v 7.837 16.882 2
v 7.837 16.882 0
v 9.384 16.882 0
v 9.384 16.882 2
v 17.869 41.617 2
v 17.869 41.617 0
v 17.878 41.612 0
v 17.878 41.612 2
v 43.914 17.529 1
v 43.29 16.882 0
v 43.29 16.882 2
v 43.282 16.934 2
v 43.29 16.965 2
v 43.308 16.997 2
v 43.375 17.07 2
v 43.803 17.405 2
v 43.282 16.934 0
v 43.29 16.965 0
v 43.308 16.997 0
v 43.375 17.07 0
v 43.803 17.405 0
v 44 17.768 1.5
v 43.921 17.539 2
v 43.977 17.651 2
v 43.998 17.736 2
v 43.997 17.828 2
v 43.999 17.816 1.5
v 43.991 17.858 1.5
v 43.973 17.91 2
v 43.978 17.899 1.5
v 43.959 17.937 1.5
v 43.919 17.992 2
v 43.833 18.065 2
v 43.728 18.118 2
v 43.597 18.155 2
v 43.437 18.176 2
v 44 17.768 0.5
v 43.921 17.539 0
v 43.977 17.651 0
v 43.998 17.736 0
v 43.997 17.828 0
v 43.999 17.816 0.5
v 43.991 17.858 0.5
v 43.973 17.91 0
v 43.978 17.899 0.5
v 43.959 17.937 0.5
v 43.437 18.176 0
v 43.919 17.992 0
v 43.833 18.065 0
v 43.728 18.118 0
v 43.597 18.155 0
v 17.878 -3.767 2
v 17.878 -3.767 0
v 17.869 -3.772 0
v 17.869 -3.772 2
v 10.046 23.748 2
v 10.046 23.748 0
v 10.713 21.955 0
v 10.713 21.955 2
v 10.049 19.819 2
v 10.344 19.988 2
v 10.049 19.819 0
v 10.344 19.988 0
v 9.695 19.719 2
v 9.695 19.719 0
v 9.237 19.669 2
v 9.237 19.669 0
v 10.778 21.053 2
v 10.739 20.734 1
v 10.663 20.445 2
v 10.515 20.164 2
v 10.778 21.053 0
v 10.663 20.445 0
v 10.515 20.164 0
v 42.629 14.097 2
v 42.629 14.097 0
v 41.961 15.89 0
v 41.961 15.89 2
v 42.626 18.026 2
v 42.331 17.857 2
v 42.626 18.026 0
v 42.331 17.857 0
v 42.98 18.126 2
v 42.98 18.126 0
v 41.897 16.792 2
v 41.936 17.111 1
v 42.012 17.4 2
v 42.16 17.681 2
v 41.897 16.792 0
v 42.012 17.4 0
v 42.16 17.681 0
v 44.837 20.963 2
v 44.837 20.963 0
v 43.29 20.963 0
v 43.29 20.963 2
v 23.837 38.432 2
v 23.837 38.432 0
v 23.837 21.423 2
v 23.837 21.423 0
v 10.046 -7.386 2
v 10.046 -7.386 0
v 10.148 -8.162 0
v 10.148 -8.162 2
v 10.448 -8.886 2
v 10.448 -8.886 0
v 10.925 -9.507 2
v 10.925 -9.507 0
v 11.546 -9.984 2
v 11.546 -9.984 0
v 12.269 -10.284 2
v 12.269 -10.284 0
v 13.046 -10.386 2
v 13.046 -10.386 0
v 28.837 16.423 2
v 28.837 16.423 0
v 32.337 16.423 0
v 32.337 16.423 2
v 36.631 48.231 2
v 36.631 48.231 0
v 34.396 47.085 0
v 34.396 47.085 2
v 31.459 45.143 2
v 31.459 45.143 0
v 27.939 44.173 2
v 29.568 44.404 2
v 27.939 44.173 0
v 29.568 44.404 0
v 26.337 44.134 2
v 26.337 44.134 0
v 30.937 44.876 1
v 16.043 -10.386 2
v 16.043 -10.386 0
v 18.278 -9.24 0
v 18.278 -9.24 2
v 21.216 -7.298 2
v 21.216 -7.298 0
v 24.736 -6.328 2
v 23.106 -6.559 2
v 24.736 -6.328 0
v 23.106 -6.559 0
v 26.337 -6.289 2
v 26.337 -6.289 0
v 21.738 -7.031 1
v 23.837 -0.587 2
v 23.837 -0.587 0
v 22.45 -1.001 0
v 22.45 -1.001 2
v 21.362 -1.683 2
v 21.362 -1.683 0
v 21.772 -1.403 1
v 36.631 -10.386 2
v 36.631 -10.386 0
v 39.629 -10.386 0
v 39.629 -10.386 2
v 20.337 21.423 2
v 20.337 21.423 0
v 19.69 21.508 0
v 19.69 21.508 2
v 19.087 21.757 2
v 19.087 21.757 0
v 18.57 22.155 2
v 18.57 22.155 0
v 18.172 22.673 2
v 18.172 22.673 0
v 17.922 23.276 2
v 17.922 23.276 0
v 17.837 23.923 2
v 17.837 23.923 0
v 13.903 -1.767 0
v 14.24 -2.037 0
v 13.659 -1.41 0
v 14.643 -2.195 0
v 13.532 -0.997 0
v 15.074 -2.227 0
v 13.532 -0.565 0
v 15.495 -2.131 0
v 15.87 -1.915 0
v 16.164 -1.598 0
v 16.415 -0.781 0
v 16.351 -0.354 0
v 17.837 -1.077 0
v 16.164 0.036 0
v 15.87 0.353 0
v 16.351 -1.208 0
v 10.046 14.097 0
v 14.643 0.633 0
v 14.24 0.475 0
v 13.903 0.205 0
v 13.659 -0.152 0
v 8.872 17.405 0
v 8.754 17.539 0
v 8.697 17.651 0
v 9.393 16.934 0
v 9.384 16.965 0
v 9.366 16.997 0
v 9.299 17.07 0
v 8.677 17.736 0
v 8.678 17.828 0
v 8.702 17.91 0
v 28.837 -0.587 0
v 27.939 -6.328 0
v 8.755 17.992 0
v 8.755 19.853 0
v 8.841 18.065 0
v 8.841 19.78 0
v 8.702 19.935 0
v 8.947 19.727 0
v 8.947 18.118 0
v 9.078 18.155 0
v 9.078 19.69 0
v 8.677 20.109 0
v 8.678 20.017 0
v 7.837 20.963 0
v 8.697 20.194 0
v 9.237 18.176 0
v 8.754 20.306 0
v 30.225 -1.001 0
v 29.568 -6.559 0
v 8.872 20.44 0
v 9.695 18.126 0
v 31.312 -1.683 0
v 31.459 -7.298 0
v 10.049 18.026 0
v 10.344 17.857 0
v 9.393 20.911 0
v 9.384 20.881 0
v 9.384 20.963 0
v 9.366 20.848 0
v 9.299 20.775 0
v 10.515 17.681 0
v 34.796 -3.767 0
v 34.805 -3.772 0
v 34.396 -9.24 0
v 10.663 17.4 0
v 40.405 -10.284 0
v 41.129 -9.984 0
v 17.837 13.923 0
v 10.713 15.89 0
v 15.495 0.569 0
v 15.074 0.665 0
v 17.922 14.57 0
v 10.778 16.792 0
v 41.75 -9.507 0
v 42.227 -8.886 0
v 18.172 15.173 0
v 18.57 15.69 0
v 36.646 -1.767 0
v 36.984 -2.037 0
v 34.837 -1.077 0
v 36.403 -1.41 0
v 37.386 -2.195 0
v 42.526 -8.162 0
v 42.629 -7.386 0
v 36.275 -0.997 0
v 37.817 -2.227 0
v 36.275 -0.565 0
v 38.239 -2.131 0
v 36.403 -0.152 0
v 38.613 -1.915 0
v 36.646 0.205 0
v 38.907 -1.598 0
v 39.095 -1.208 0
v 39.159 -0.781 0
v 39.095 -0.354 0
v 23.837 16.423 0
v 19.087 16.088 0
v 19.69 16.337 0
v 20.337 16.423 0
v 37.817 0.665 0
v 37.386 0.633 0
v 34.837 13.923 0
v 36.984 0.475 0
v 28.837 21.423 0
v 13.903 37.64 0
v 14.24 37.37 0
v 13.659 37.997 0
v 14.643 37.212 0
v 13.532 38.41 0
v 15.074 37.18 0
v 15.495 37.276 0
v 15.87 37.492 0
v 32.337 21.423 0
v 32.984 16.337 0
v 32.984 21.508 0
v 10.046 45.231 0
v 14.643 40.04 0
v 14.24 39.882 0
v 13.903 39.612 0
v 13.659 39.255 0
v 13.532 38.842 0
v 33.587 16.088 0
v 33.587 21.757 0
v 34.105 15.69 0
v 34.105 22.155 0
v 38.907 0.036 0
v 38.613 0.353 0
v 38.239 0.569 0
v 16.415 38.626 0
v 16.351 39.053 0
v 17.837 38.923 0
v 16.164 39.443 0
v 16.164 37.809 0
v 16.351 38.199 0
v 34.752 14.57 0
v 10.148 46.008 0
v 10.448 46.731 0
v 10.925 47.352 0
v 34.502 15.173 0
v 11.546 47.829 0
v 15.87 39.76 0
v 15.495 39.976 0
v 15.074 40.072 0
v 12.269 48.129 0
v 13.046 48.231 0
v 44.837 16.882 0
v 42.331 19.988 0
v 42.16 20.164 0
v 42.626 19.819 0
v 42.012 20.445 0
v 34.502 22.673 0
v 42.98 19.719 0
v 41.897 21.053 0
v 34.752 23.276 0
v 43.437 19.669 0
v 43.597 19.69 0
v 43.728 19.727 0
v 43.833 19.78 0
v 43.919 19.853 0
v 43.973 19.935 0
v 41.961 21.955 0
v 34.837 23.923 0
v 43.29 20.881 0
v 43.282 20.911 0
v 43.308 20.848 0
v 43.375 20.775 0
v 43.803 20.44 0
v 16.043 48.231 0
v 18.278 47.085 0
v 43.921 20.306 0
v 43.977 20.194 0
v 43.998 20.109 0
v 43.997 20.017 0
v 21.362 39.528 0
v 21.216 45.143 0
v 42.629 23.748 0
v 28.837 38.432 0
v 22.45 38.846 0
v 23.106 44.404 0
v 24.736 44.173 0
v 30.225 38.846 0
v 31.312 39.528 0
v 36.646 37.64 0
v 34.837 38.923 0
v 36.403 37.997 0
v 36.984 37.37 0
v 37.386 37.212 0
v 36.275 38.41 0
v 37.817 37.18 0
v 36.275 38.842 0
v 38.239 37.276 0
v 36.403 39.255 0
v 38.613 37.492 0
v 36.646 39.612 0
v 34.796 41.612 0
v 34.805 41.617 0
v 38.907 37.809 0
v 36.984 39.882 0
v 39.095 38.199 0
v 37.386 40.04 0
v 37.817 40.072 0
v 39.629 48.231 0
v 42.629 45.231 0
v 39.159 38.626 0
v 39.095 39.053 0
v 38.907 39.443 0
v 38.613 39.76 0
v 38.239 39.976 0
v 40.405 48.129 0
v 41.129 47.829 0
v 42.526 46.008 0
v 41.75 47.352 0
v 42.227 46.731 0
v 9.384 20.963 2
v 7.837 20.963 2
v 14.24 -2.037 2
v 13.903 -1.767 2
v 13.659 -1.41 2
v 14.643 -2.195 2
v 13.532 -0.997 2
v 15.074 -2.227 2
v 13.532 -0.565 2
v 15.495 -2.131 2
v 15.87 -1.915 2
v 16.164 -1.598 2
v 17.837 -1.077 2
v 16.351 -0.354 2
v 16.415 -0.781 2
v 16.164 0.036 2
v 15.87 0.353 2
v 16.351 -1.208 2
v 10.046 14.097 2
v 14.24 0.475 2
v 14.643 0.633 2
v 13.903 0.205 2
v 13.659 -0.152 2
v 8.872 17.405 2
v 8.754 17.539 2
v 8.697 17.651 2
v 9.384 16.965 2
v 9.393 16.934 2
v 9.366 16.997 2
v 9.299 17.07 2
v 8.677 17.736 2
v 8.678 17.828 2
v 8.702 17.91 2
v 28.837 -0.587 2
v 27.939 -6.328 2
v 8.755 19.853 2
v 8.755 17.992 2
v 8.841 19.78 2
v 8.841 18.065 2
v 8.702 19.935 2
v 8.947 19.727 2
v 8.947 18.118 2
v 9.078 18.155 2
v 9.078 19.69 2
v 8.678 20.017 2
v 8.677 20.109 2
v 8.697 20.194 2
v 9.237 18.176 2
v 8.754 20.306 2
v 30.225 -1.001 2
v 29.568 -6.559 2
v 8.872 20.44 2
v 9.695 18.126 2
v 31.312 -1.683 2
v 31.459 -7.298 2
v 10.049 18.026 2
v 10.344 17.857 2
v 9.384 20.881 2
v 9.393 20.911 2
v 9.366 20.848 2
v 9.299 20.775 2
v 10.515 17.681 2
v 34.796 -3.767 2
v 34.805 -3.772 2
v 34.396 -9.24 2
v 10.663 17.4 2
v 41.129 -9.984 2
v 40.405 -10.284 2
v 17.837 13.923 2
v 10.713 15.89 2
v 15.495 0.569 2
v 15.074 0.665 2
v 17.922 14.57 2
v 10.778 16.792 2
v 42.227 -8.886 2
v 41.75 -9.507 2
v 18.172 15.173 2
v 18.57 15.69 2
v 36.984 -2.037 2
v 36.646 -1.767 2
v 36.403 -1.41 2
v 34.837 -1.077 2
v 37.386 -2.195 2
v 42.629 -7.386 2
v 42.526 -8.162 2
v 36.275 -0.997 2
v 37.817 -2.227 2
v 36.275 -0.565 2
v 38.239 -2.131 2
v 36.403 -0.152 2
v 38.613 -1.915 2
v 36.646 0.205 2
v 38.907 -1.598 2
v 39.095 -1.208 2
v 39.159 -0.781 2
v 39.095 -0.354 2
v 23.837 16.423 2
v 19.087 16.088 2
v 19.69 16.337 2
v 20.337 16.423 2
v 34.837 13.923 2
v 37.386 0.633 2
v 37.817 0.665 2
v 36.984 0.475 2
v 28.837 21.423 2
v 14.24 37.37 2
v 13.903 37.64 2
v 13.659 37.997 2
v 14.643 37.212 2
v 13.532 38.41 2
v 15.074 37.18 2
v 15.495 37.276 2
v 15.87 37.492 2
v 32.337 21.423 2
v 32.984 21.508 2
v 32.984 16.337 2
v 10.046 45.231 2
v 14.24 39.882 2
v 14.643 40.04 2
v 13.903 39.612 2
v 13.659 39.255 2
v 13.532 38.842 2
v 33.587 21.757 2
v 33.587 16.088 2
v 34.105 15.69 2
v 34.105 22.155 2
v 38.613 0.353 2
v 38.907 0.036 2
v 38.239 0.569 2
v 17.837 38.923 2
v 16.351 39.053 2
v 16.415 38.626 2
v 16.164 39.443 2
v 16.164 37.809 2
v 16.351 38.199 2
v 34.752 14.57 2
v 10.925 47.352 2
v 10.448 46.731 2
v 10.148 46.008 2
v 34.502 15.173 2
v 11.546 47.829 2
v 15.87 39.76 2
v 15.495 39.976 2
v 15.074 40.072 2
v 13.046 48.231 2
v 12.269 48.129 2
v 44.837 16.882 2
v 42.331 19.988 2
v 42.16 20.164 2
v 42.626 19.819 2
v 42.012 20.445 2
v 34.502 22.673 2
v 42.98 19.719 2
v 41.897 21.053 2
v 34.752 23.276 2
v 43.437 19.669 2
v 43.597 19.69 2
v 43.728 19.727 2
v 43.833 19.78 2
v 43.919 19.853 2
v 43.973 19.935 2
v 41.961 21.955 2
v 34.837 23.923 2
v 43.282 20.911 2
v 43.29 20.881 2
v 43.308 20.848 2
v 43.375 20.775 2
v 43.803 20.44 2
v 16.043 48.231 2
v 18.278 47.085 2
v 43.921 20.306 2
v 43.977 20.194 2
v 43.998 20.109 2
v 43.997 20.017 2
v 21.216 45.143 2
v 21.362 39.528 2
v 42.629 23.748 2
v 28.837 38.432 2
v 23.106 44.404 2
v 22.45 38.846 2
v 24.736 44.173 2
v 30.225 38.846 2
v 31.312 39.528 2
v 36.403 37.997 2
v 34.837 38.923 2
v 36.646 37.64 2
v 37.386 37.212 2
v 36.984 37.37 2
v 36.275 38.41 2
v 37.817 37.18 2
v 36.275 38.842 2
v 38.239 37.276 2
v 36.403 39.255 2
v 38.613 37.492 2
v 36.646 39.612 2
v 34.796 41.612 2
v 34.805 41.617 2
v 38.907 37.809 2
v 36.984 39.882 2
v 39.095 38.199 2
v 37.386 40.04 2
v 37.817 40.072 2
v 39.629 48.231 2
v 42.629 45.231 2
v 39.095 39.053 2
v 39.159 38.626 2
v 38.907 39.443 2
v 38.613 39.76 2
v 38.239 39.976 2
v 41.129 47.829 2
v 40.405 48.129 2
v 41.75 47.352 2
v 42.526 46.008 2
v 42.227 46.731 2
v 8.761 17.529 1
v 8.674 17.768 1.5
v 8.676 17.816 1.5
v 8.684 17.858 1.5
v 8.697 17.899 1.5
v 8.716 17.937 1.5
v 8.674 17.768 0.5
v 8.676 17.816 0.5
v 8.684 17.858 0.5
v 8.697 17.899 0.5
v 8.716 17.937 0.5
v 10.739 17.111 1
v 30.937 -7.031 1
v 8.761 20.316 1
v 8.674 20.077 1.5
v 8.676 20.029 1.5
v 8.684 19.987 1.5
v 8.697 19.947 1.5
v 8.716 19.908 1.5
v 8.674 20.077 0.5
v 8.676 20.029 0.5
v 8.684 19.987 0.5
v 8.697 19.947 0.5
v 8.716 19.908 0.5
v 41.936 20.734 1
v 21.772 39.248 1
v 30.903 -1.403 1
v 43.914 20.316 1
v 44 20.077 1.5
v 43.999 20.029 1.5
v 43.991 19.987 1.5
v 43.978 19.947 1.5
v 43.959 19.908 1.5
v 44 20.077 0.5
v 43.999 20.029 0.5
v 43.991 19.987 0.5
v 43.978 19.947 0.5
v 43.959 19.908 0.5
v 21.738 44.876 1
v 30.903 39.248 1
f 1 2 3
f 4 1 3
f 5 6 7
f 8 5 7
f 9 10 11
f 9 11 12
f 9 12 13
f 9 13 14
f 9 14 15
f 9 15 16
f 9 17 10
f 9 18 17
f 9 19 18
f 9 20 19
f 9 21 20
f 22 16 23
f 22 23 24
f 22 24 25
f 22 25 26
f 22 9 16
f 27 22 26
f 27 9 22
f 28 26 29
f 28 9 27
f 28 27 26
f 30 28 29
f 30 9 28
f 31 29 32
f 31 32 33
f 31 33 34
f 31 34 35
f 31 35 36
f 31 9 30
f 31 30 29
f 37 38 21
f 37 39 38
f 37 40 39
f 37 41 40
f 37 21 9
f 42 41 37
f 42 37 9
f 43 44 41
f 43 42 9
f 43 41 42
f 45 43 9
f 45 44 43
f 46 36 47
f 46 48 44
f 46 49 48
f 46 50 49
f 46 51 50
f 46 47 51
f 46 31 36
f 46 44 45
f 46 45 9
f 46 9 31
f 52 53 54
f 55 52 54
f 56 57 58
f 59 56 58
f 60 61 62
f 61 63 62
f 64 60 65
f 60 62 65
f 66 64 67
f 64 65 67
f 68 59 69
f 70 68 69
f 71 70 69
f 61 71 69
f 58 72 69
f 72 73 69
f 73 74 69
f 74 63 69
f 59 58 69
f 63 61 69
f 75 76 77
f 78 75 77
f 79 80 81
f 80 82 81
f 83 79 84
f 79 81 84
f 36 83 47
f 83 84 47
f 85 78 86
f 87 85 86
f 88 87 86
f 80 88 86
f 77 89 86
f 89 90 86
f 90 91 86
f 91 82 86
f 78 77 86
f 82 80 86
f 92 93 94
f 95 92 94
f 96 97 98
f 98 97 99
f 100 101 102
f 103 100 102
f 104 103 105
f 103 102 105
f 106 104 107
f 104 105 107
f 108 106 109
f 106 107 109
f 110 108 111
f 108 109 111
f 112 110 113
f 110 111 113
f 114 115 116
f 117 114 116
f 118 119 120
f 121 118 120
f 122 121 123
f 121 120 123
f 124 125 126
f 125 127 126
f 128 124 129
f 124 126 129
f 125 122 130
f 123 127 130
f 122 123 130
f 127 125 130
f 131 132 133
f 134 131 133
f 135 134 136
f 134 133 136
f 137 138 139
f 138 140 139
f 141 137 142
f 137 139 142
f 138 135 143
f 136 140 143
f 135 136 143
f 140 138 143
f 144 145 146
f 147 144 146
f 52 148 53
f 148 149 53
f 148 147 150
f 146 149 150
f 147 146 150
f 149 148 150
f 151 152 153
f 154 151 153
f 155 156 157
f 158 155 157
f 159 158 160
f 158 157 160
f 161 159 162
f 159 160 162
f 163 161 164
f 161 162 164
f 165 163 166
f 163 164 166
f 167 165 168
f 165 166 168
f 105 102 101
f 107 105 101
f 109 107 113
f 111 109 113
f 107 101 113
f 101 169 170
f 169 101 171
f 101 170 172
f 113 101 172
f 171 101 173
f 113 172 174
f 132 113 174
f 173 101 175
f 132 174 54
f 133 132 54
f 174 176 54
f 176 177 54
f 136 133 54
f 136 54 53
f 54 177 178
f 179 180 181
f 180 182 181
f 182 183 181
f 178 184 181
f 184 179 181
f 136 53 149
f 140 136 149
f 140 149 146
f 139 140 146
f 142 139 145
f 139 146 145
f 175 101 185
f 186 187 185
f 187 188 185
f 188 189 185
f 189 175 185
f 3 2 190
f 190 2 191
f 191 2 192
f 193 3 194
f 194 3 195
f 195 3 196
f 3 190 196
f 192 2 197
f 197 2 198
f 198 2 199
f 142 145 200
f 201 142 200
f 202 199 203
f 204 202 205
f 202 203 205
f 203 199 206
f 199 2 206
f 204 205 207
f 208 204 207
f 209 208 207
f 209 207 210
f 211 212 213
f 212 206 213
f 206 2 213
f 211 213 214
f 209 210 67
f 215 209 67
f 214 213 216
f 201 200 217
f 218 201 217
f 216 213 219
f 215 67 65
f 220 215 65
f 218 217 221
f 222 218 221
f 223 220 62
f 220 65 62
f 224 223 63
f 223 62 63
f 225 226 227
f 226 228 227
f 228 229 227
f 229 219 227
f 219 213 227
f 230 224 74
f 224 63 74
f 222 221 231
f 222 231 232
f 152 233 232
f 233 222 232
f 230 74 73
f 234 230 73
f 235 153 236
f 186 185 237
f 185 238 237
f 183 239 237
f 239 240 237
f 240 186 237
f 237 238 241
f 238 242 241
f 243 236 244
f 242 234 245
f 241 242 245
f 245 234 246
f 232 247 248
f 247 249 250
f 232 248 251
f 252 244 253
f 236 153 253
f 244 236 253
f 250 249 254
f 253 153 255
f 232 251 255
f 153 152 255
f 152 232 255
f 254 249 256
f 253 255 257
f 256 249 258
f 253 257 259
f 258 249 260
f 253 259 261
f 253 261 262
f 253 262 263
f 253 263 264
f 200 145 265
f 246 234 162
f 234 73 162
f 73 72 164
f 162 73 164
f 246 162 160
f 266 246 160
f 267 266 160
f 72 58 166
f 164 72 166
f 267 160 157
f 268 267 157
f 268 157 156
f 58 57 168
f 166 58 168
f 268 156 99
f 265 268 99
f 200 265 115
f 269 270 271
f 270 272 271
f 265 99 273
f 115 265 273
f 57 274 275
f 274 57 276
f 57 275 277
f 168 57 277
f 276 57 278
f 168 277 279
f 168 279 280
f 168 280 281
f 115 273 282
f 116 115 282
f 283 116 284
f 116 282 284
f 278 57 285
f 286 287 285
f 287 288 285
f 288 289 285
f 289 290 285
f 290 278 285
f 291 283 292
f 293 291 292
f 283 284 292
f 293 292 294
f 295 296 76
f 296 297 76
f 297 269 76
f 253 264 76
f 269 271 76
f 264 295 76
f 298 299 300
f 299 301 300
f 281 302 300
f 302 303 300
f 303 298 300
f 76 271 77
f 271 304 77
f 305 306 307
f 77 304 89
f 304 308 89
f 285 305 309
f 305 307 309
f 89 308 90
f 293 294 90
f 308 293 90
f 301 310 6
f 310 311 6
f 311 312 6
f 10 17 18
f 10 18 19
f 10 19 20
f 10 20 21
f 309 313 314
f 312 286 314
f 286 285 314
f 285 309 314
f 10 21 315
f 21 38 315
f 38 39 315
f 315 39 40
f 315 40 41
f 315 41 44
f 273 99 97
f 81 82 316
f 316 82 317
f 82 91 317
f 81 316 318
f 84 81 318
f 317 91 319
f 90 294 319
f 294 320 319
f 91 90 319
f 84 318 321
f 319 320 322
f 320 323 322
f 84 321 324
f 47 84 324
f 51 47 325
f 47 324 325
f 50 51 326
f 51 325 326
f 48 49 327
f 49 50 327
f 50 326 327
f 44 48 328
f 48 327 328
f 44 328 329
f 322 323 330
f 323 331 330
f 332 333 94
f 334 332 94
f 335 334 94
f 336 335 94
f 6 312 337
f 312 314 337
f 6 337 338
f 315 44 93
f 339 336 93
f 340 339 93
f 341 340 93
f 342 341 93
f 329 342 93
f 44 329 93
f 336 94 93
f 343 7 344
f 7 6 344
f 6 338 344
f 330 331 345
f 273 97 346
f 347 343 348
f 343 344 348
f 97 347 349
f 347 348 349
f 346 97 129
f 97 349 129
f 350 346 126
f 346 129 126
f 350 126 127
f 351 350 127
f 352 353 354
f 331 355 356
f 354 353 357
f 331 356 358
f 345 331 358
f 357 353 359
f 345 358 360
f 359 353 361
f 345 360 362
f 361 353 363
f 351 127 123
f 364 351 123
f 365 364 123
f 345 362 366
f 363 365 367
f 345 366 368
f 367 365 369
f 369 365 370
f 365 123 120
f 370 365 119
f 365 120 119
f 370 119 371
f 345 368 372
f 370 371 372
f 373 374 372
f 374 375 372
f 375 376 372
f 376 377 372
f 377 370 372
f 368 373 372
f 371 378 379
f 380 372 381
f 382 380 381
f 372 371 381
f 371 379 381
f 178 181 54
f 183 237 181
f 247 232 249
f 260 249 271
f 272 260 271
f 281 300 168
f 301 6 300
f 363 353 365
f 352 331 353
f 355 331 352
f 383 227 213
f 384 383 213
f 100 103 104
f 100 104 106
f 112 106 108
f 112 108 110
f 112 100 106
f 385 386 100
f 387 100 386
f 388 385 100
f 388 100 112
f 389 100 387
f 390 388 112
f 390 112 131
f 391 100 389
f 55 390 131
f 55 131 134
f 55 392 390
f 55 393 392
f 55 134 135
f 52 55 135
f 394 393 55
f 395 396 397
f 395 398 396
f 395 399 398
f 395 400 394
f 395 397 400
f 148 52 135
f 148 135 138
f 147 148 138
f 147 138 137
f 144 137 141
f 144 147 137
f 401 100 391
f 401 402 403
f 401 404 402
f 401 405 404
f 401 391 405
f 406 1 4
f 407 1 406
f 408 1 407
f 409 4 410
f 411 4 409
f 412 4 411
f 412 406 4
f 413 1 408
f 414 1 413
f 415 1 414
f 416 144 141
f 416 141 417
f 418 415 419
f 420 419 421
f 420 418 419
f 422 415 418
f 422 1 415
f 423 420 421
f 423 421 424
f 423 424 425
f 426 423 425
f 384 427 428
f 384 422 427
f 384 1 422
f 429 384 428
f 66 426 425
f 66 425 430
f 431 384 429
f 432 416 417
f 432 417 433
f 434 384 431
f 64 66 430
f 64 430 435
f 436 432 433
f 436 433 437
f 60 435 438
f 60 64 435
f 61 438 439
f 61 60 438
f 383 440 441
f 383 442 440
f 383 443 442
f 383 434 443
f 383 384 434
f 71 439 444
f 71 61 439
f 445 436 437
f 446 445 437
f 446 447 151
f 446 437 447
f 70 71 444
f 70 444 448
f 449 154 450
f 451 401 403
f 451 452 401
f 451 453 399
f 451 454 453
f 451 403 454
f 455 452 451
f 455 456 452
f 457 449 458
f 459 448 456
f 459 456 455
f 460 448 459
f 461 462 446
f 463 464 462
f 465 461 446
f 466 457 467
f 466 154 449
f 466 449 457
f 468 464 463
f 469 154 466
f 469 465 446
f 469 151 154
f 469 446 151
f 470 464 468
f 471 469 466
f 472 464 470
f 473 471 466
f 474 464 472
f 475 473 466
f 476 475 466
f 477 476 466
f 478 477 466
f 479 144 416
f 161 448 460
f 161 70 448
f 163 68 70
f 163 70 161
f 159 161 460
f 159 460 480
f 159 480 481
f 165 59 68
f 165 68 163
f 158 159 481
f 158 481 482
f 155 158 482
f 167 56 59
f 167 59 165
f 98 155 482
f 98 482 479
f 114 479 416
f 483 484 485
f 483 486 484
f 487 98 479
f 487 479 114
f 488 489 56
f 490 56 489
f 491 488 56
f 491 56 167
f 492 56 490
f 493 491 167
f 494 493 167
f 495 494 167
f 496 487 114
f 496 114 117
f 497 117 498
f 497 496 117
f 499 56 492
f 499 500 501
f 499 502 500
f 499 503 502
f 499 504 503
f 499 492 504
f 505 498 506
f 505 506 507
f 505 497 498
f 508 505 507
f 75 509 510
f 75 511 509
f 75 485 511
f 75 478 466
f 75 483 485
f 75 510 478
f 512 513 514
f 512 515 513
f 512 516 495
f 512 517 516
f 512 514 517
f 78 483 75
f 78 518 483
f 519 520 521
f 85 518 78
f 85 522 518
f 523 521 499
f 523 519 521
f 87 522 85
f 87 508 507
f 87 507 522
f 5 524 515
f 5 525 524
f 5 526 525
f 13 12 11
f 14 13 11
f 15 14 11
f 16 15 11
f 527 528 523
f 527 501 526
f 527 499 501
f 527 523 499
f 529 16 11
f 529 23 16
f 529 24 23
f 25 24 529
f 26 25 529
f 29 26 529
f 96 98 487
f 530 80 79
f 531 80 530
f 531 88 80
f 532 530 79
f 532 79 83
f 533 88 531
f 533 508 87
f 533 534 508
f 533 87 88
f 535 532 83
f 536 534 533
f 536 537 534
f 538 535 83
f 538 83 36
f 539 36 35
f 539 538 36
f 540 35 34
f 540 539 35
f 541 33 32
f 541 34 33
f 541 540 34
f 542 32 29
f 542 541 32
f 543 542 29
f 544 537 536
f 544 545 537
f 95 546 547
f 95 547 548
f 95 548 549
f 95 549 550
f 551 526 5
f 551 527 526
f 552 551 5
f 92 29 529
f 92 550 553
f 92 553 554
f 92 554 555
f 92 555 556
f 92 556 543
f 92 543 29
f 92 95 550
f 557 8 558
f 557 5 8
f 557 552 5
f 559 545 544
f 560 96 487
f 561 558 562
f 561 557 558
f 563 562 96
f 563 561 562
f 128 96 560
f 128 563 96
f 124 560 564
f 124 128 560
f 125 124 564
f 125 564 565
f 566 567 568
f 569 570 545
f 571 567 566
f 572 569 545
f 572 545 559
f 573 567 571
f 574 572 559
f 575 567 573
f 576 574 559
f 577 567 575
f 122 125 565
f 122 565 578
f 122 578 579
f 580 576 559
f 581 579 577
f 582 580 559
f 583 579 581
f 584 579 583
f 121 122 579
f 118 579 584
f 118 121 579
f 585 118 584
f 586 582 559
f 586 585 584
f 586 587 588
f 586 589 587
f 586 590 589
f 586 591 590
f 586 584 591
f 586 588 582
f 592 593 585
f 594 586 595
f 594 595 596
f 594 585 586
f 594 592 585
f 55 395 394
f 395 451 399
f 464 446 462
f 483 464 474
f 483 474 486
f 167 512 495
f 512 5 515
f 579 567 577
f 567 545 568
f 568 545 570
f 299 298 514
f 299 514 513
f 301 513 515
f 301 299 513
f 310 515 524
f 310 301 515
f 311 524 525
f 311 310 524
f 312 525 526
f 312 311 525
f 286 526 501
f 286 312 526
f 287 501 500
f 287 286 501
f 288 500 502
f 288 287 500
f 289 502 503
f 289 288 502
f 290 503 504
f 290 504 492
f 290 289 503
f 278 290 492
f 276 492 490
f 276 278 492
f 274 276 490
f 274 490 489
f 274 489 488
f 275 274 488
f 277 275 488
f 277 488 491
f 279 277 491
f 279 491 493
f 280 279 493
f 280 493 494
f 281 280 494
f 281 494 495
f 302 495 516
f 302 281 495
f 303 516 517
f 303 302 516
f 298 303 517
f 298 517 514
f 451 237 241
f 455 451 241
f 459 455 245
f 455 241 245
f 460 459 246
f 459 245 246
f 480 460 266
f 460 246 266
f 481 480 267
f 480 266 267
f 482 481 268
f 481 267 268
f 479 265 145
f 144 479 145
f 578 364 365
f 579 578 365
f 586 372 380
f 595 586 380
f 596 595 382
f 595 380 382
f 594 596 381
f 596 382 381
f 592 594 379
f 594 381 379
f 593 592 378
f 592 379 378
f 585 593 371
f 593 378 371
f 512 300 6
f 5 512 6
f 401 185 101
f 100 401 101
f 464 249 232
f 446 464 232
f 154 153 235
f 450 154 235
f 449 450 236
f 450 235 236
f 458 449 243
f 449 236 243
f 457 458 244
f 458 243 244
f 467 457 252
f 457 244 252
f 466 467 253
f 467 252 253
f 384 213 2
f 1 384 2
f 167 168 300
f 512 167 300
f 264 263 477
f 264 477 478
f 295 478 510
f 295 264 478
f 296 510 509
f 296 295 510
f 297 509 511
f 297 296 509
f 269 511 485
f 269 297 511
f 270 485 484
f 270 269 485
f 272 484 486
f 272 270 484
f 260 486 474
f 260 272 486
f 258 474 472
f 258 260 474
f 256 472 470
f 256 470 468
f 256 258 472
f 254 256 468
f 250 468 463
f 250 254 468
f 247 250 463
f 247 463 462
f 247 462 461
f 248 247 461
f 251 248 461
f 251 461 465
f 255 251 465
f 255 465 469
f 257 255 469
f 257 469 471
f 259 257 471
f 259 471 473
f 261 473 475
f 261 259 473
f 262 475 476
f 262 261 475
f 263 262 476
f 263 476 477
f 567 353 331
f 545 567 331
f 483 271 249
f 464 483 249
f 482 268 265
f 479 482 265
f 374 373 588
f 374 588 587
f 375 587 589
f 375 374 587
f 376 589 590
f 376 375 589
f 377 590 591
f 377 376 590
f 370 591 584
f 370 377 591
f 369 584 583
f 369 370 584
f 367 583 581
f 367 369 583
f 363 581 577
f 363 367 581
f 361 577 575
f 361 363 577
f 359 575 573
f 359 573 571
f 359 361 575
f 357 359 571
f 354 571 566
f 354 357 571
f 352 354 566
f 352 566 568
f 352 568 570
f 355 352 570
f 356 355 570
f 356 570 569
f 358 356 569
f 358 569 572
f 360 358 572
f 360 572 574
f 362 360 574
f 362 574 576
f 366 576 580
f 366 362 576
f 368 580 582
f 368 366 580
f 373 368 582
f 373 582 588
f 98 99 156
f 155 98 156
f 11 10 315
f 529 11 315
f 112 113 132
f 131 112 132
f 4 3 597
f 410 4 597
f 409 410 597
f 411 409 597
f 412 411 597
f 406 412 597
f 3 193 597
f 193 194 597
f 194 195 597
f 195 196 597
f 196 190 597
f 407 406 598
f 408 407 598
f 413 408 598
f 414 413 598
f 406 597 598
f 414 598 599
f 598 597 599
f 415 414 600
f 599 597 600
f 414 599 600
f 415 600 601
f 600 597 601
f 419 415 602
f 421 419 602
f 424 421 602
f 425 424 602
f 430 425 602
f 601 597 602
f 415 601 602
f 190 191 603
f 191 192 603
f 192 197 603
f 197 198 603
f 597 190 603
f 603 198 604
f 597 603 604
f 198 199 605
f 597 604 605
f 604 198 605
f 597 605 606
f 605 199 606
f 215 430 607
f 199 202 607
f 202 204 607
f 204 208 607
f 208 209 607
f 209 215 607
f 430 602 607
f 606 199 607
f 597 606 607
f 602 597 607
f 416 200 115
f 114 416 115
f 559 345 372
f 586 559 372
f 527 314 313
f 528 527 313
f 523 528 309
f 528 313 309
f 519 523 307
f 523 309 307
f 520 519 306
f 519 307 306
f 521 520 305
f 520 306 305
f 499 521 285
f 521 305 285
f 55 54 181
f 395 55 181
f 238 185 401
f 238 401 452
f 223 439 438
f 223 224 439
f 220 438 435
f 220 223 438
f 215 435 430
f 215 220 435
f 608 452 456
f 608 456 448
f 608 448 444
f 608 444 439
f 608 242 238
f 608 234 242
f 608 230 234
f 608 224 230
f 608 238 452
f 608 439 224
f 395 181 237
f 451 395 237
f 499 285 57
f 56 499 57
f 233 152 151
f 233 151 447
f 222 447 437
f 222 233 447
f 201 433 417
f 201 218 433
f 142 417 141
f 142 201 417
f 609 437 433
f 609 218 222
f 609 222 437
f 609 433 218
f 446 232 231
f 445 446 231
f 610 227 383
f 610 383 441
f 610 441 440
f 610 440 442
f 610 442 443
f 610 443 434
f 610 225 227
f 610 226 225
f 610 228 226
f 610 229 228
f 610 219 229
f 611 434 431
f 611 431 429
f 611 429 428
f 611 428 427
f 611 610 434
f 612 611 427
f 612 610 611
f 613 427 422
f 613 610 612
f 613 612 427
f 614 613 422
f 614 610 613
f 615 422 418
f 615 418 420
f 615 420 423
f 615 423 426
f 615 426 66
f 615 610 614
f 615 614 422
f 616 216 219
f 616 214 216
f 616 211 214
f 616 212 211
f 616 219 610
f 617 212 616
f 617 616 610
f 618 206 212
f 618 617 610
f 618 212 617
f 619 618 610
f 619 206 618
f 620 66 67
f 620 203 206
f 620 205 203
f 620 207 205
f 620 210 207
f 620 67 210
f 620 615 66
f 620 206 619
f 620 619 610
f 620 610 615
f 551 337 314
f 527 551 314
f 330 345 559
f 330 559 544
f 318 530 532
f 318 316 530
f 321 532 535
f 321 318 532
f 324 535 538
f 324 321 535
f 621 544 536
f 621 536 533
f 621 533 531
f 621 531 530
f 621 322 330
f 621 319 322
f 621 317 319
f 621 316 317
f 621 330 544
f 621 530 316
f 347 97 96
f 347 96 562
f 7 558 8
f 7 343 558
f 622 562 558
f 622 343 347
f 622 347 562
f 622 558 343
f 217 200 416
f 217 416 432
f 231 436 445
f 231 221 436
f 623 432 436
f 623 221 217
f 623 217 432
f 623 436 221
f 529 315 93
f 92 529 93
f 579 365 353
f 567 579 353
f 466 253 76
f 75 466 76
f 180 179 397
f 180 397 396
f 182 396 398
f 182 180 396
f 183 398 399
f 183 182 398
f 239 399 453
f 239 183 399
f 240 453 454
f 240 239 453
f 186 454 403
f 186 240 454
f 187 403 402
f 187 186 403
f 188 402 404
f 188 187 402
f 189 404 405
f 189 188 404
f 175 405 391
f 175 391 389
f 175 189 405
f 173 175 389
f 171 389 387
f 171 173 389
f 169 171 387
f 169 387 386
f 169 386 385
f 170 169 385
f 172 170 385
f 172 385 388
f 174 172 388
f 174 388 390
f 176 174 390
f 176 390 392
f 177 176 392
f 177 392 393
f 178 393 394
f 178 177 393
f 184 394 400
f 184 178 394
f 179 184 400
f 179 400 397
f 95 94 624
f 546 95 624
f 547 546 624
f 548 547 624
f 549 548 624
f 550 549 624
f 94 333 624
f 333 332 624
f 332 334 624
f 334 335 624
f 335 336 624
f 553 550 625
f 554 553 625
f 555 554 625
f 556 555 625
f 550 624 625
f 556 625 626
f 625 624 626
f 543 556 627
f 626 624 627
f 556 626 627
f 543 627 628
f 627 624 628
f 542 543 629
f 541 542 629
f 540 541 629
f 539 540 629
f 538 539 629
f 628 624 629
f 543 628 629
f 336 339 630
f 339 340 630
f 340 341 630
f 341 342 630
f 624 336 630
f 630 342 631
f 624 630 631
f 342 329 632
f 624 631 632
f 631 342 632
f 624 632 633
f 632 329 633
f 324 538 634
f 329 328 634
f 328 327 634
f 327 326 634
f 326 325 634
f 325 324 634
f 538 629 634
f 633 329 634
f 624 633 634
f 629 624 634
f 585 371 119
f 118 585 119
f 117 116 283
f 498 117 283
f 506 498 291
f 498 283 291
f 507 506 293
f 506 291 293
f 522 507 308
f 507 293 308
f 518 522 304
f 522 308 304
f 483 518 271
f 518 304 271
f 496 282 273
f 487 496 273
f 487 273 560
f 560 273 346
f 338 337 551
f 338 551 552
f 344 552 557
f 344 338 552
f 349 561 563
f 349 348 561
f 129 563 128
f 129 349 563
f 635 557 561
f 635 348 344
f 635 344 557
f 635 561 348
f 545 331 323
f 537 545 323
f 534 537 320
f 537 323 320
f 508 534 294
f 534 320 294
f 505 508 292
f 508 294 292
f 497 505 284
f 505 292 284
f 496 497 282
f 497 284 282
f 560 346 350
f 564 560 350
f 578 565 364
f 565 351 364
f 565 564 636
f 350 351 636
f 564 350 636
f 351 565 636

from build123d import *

# Parameters (mm, degrees)
F0_R     = 1.45
F1_DEPTH = 2


with BuildPart() as f1:
    # F0 (on Top) → F1 (new body)
    with BuildSketch(Plane.XY):
        with BuildLine():
            Line((16.0432131672, 48.2310554204), (13.0458830723, 48.2310554204))
            ThreePointArc((13.0458830723, 48.2310554204), (10.9245627287, 47.352375764), (10.0458830723, 45.2310554204))
            Line((10.0458830723, 45.2310554204), (10.0458830723, 23.7476840101))
            add(Edge.make_bspline(
                [(10.0458830723, 23.7476840101), (10.7115456302, 22.4846217094), (11.005823731, 20.7161298766), (10.3430984406, 19.7198280209), (9.2372713755, 19.6688592385)],
                knots=[0, 0, 0, 0, 0.5644517657, 1, 1, 1, 1], degree=3))
            add(Edge.make_bspline(
                [(9.3841085265, 20.9630623411), (9.4691643546, 20.7871442379), (8.4748883735, 20.4145718213), (8.6683240442, 19.7080140495), (9.2372713755, 19.6688592385)],
                knots=[0, 0, 0, 0, 0.5139461709, 1, 1, 1, 1], degree=3))
            Line((9.3841085265, 20.9630623411), (8.2844858954, 20.9630623411))
            Line((8.2844858954, 20.9630623411), (7.8372713755, 20.9630623411))
            Line((7.8372713755, 20.9630623411), (7.8372713755, 18.9225599587))
            Line((7.8372713755, 18.9225599587), (26.3372713755, 18.9225599587))
            Line((26.3372713755, 18.9225599587), (26.3372713755, 44.1340877949))
            add(Edge.make_bspline(
                [(16.0432131672, 48.2310554204), (17.9878656476, 47.6235912963), (21.4636227702, 44.1599026946), (24.841907136, 44.140700061), (26.3372713755, 44.1340877949)],
                knots=[0.341159936, 0.341159936, 0.341159936, 0.341159936, 0.6993169326, 1, 1, 1, 1], degree=3))
        make_face()
        with BuildLine():
            add(Edge.make_bspline(
                [(23.8372713755, 38.432449385), (22.5156090399, 38.7503102684), (22.055353444, 39.0385909711), (19.4297470837, 40.8717350173), (17.8784877062, 41.6118882482)],
                knots=[0.0042165568, 0.0042165568, 0.0042165568, 0.0042165568, 0.4134444878, 1, 1, 1, 1], degree=3))
            Line((23.8372713755, 38.432449385), (23.8372713755, 23.1634433148))
            Line((23.8372713755, 23.1634433148), (23.8372713755, 21.4225599587))
            Line((23.8372713755, 21.4225599587), (22.228775843, 21.4225599587))
            Line((22.228775843, 21.4225599587), (20.3372713755, 21.4225599587))
            ThreePointArc((20.3372713755, 21.4225599587), (18.5695044225, 22.1547930057), (17.8372713755, 23.9225599587))
            Line((17.8372713755, 23.9225599587), (17.8372713755, 38.9225599587))
            Line((17.8372713755, 38.9225599587), (17.8691951823, 41.617109993))
            Line((17.8691951823, 41.617109993), (17.8784877062, 41.6118882482))
        make_face(mode=Mode.SUBTRACT)
        with Locations((14.9654557983, 38.6260170906)):
            Circle(F0_R, mode=Mode.SUBTRACT)
        with BuildLine():
            add(Edge.make_bspline(
                [(36.6313295837, 48.2310554204), (34.6866771033, 47.6235912963), (31.2109199807, 44.1599026946), (27.8326356149, 44.140700061), (26.3372713755, 44.1340877949)],
                knots=[0.341159936, 0.341159936, 0.341159936, 0.341159936, 0.6993169326, 1, 1, 1, 1], degree=3))
            Line((26.3372713755, 44.1340877949), (26.3372713755, 18.9225599587))
            Line((26.3372713755, 18.9225599587), (44.8372713755, 18.9225599587))
            Line((44.8372713755, 18.9225599587), (44.8372713755, 20.9630623411))
            Line((44.8372713755, 20.9630623411), (44.3900568555, 20.9630623411))
            Line((44.3900568555, 20.9630623411), (43.2904342244, 20.9630623411))
            add(Edge.make_bspline(
                [(43.2904342244, 20.9630623411), (43.2053783963, 20.7871442379), (44.1996543774, 20.4145718213), (44.0062187067, 19.7080140495), (43.4372713755, 19.6688592385)],
                knots=[0, 0, 0, 0, 0.5139461709, 1, 1, 1, 1], degree=3))
            add(Edge.make_bspline(
                [(42.6286596786, 23.7476840101), (41.9629971207, 22.4846217094), (41.6687190199, 20.7161298766), (42.3314443103, 19.7198280209), (43.4372713755, 19.6688592385)],
                knots=[0, 0, 0, 0, 0.5644517657, 1, 1, 1, 1], degree=3))
            Line((42.6286596786, 23.7476840101), (42.6286596786, 45.2310554204))
            ThreePointArc((42.6286596786, 45.2310554204), (41.7499800222, 47.352375764), (39.6286596786, 48.2310554204))
            Line((39.6286596786, 48.2310554204), (36.6313295837, 48.2310554204))
        make_face()
        with BuildLine():
            add(Edge.make_bspline(
                [(28.8372713755, 38.432449385), (30.158933711, 38.7503102684), (30.619189307, 39.0385909711), (33.2447956672, 40.8717350173), (34.7960550447, 41.6118882482)],
                knots=[0.0042165568, 0.0042165568, 0.0042165568, 0.0042165568, 0.4134444878, 1, 1, 1, 1], degree=3))
            Line((34.7960550447, 41.6118882482), (34.8053475686, 41.617109993))
            Line((34.8053475686, 41.617109993), (34.8372713755, 38.9225599587))
            Line((34.8372713755, 38.9225599587), (34.8372713755, 23.9225599587))
            ThreePointArc((34.8372713755, 23.9225599587), (34.1050383284, 22.1547930057), (32.3372713755, 21.4225599587))
            Line((32.3372713755, 21.4225599587), (30.4457669079, 21.4225599587))
            Line((30.4457669079, 21.4225599587), (28.8372713755, 21.4225599587))
            Line((28.8372713755, 21.4225599587), (28.8372713755, 23.1634433148))
            Line((28.8372713755, 23.1634433148), (28.8372713755, 38.432449385))
        make_face(mode=Mode.SUBTRACT)
        with Locations((37.7090869526, 38.6260170906)):
            Circle(F0_R, mode=Mode.SUBTRACT)
        with BuildLine():
            Line((44.8372713755, 18.9225599587), (26.3372713755, 18.9225599587))
            Line((26.3372713755, 18.9225599587), (26.3372713755, -6.2889678775))
            add(Edge.make_bspline(
                [(36.6313295837, -10.3859355031), (34.6866771033, -9.7784713789), (31.2109199807, -6.3147827772), (27.8326356149, -6.2955801437), (26.3372713755, -6.2889678775)],
                knots=[0.341159936, 0.341159936, 0.341159936, 0.341159936, 0.6993169326, 1, 1, 1, 1], degree=3))
            Line((36.6313295837, -10.3859355031), (39.6286596786, -10.3859355031))
            ThreePointArc((39.6286596786, -10.3859355031), (41.7499800222, -9.5072558467), (42.6286596786, -7.3859355031))
            Line((42.6286596786, -7.3859355031), (42.6286596786, 14.0974359072))
            add(Edge.make_bspline(
                [(42.6286596786, 14.0974359072), (41.9629971207, 15.3604982079), (41.6687190199, 17.1289900407), (42.3314443103, 18.1252918964), (43.4372713755, 18.1762606788)],
                knots=[0, 0, 0, 0, 0.5644517657, 1, 1, 1, 1], degree=3))
            add(Edge.make_bspline(
                [(43.2904342244, 16.8820575762), (43.2053783963, 17.0579756794), (44.1996543774, 17.430548096), (44.0062187067, 18.1371058678), (43.4372713755, 18.1762606788)],
                knots=[0, 0, 0, 0, 0.5139461709, 1, 1, 1, 1], degree=3))
            Line((43.2904342244, 16.8820575762), (44.3900568555, 16.8820575762))
            Line((44.3900568555, 16.8820575762), (44.8372713755, 16.8820575762))
            Line((44.8372713755, 16.8820575762), (44.8372713755, 18.9225599587))
        make_face()
        with Locations((37.7090869526, -0.7808971733)):
            Circle(F0_R, mode=Mode.SUBTRACT)
        with BuildLine():
            Line((34.8053475686, -3.7719900757), (34.7960550447, -3.7667683309))
            add(Edge.make_bspline(
                [(28.8372713755, -0.5873294677), (30.158933711, -0.9051903511), (30.619189307, -1.1934710537), (33.2447956672, -3.0266151), (34.7960550447, -3.7667683309)],
                knots=[0.0042165568, 0.0042165568, 0.0042165568, 0.0042165568, 0.4134444878, 1, 1, 1, 1], degree=3))
            Line((28.8372713755, -0.5873294677), (28.8372713755, 14.6816766025))
            Line((28.8372713755, 14.6816766025), (28.8372713755, 16.4225599587))
            Line((28.8372713755, 16.4225599587), (30.4457669079, 16.4225599587))
            Line((30.4457669079, 16.4225599587), (32.3372713755, 16.4225599587))
            ThreePointArc((32.3372713755, 16.4225599587), (34.1050383284, 15.6903269116), (34.8372713755, 13.9225599587))
            Line((34.8372713755, 13.9225599587), (34.8372713755, -1.0774400413))
            Line((34.8372713755, -1.0774400413), (34.8053475686, -3.7719900757))
        make_face(mode=Mode.SUBTRACT)
        with BuildLine():
            Line((26.3372713755, -6.2889678775), (26.3372713755, 18.9225599587))
            Line((26.3372713755, 18.9225599587), (7.8372713755, 18.9225599587))
            Line((7.8372713755, 18.9225599587), (7.8372713755, 16.8820575762))
            Line((7.8372713755, 16.8820575762), (8.2844858954, 16.8820575762))
            Line((8.2844858954, 16.8820575762), (9.3841085265, 16.8820575762))
            add(Edge.make_bspline(
                [(9.3841085265, 16.8820575762), (9.4691643546, 17.0579756794), (8.4748883735, 17.430548096), (8.6683240442, 18.1371058678), (9.2372713755, 18.1762606788)],
                knots=[0, 0, 0, 0, 0.5139461709, 1, 1, 1, 1], degree=3))
            add(Edge.make_bspline(
                [(10.0458830723, 14.0974359072), (10.7115456302, 15.3604982079), (11.005823731, 17.1289900407), (10.3430984406, 18.1252918964), (9.2372713755, 18.1762606788)],
                knots=[0, 0, 0, 0, 0.5644517657, 1, 1, 1, 1], degree=3))
            Line((10.0458830723, 14.0974359072), (10.0458830723, -7.3859355031))
            ThreePointArc((10.0458830723, -7.3859355031), (10.9245627287, -9.5072558467), (13.0458830723, -10.3859355031))
            Line((13.0458830723, -10.3859355031), (16.0432131672, -10.3859355031))
            add(Edge.make_bspline(
                [(16.0432131672, -10.3859355031), (17.9878656476, -9.7784713789), (21.4636227702, -6.3147827772), (24.841907136, -6.2955801437), (26.3372713755, -6.2889678775)],
                knots=[0.341159936, 0.341159936, 0.341159936, 0.341159936, 0.6993169326, 1, 1, 1, 1], degree=3))
        make_face()
        with Locations((14.9654557983, -0.7808971733)):
            Circle(F0_R, mode=Mode.SUBTRACT)
        with BuildLine():
            add(Edge.make_bspline(
                [(23.8372713755, -0.5873294677), (22.5156090399, -0.9051903511), (22.055353444, -1.1934710537), (19.4297470837, -3.0266151), (17.8784877062, -3.7667683309)],
                knots=[0.0042165568, 0.0042165568, 0.0042165568, 0.0042165568, 0.4134444878, 1, 1, 1, 1], degree=3))
            Line((17.8784877062, -3.7667683309), (17.8691951823, -3.7719900757))
            Line((17.8691951823, -3.7719900757), (17.8372713755, -1.0774400413))
            Line((17.8372713755, -1.0774400413), (17.8372713755, 13.9225599587))
            ThreePointArc((17.8372713755, 13.9225599587), (18.5695044225, 15.6903269116), (20.3372713755, 16.4225599587))
            Line((20.3372713755, 16.4225599587), (22.228775843, 16.4225599587))
            Line((22.228775843, 16.4225599587), (23.8372713755, 16.4225599587))
            Line((23.8372713755, 16.4225599587), (23.8372713755, 14.6816766025))
            Line((23.8372713755, 14.6816766025), (23.8372713755, -0.5873294677))
        make_face(mode=Mode.SUBTRACT)
    extrude(amount=F1_DEPTH)


solid = f1.part
